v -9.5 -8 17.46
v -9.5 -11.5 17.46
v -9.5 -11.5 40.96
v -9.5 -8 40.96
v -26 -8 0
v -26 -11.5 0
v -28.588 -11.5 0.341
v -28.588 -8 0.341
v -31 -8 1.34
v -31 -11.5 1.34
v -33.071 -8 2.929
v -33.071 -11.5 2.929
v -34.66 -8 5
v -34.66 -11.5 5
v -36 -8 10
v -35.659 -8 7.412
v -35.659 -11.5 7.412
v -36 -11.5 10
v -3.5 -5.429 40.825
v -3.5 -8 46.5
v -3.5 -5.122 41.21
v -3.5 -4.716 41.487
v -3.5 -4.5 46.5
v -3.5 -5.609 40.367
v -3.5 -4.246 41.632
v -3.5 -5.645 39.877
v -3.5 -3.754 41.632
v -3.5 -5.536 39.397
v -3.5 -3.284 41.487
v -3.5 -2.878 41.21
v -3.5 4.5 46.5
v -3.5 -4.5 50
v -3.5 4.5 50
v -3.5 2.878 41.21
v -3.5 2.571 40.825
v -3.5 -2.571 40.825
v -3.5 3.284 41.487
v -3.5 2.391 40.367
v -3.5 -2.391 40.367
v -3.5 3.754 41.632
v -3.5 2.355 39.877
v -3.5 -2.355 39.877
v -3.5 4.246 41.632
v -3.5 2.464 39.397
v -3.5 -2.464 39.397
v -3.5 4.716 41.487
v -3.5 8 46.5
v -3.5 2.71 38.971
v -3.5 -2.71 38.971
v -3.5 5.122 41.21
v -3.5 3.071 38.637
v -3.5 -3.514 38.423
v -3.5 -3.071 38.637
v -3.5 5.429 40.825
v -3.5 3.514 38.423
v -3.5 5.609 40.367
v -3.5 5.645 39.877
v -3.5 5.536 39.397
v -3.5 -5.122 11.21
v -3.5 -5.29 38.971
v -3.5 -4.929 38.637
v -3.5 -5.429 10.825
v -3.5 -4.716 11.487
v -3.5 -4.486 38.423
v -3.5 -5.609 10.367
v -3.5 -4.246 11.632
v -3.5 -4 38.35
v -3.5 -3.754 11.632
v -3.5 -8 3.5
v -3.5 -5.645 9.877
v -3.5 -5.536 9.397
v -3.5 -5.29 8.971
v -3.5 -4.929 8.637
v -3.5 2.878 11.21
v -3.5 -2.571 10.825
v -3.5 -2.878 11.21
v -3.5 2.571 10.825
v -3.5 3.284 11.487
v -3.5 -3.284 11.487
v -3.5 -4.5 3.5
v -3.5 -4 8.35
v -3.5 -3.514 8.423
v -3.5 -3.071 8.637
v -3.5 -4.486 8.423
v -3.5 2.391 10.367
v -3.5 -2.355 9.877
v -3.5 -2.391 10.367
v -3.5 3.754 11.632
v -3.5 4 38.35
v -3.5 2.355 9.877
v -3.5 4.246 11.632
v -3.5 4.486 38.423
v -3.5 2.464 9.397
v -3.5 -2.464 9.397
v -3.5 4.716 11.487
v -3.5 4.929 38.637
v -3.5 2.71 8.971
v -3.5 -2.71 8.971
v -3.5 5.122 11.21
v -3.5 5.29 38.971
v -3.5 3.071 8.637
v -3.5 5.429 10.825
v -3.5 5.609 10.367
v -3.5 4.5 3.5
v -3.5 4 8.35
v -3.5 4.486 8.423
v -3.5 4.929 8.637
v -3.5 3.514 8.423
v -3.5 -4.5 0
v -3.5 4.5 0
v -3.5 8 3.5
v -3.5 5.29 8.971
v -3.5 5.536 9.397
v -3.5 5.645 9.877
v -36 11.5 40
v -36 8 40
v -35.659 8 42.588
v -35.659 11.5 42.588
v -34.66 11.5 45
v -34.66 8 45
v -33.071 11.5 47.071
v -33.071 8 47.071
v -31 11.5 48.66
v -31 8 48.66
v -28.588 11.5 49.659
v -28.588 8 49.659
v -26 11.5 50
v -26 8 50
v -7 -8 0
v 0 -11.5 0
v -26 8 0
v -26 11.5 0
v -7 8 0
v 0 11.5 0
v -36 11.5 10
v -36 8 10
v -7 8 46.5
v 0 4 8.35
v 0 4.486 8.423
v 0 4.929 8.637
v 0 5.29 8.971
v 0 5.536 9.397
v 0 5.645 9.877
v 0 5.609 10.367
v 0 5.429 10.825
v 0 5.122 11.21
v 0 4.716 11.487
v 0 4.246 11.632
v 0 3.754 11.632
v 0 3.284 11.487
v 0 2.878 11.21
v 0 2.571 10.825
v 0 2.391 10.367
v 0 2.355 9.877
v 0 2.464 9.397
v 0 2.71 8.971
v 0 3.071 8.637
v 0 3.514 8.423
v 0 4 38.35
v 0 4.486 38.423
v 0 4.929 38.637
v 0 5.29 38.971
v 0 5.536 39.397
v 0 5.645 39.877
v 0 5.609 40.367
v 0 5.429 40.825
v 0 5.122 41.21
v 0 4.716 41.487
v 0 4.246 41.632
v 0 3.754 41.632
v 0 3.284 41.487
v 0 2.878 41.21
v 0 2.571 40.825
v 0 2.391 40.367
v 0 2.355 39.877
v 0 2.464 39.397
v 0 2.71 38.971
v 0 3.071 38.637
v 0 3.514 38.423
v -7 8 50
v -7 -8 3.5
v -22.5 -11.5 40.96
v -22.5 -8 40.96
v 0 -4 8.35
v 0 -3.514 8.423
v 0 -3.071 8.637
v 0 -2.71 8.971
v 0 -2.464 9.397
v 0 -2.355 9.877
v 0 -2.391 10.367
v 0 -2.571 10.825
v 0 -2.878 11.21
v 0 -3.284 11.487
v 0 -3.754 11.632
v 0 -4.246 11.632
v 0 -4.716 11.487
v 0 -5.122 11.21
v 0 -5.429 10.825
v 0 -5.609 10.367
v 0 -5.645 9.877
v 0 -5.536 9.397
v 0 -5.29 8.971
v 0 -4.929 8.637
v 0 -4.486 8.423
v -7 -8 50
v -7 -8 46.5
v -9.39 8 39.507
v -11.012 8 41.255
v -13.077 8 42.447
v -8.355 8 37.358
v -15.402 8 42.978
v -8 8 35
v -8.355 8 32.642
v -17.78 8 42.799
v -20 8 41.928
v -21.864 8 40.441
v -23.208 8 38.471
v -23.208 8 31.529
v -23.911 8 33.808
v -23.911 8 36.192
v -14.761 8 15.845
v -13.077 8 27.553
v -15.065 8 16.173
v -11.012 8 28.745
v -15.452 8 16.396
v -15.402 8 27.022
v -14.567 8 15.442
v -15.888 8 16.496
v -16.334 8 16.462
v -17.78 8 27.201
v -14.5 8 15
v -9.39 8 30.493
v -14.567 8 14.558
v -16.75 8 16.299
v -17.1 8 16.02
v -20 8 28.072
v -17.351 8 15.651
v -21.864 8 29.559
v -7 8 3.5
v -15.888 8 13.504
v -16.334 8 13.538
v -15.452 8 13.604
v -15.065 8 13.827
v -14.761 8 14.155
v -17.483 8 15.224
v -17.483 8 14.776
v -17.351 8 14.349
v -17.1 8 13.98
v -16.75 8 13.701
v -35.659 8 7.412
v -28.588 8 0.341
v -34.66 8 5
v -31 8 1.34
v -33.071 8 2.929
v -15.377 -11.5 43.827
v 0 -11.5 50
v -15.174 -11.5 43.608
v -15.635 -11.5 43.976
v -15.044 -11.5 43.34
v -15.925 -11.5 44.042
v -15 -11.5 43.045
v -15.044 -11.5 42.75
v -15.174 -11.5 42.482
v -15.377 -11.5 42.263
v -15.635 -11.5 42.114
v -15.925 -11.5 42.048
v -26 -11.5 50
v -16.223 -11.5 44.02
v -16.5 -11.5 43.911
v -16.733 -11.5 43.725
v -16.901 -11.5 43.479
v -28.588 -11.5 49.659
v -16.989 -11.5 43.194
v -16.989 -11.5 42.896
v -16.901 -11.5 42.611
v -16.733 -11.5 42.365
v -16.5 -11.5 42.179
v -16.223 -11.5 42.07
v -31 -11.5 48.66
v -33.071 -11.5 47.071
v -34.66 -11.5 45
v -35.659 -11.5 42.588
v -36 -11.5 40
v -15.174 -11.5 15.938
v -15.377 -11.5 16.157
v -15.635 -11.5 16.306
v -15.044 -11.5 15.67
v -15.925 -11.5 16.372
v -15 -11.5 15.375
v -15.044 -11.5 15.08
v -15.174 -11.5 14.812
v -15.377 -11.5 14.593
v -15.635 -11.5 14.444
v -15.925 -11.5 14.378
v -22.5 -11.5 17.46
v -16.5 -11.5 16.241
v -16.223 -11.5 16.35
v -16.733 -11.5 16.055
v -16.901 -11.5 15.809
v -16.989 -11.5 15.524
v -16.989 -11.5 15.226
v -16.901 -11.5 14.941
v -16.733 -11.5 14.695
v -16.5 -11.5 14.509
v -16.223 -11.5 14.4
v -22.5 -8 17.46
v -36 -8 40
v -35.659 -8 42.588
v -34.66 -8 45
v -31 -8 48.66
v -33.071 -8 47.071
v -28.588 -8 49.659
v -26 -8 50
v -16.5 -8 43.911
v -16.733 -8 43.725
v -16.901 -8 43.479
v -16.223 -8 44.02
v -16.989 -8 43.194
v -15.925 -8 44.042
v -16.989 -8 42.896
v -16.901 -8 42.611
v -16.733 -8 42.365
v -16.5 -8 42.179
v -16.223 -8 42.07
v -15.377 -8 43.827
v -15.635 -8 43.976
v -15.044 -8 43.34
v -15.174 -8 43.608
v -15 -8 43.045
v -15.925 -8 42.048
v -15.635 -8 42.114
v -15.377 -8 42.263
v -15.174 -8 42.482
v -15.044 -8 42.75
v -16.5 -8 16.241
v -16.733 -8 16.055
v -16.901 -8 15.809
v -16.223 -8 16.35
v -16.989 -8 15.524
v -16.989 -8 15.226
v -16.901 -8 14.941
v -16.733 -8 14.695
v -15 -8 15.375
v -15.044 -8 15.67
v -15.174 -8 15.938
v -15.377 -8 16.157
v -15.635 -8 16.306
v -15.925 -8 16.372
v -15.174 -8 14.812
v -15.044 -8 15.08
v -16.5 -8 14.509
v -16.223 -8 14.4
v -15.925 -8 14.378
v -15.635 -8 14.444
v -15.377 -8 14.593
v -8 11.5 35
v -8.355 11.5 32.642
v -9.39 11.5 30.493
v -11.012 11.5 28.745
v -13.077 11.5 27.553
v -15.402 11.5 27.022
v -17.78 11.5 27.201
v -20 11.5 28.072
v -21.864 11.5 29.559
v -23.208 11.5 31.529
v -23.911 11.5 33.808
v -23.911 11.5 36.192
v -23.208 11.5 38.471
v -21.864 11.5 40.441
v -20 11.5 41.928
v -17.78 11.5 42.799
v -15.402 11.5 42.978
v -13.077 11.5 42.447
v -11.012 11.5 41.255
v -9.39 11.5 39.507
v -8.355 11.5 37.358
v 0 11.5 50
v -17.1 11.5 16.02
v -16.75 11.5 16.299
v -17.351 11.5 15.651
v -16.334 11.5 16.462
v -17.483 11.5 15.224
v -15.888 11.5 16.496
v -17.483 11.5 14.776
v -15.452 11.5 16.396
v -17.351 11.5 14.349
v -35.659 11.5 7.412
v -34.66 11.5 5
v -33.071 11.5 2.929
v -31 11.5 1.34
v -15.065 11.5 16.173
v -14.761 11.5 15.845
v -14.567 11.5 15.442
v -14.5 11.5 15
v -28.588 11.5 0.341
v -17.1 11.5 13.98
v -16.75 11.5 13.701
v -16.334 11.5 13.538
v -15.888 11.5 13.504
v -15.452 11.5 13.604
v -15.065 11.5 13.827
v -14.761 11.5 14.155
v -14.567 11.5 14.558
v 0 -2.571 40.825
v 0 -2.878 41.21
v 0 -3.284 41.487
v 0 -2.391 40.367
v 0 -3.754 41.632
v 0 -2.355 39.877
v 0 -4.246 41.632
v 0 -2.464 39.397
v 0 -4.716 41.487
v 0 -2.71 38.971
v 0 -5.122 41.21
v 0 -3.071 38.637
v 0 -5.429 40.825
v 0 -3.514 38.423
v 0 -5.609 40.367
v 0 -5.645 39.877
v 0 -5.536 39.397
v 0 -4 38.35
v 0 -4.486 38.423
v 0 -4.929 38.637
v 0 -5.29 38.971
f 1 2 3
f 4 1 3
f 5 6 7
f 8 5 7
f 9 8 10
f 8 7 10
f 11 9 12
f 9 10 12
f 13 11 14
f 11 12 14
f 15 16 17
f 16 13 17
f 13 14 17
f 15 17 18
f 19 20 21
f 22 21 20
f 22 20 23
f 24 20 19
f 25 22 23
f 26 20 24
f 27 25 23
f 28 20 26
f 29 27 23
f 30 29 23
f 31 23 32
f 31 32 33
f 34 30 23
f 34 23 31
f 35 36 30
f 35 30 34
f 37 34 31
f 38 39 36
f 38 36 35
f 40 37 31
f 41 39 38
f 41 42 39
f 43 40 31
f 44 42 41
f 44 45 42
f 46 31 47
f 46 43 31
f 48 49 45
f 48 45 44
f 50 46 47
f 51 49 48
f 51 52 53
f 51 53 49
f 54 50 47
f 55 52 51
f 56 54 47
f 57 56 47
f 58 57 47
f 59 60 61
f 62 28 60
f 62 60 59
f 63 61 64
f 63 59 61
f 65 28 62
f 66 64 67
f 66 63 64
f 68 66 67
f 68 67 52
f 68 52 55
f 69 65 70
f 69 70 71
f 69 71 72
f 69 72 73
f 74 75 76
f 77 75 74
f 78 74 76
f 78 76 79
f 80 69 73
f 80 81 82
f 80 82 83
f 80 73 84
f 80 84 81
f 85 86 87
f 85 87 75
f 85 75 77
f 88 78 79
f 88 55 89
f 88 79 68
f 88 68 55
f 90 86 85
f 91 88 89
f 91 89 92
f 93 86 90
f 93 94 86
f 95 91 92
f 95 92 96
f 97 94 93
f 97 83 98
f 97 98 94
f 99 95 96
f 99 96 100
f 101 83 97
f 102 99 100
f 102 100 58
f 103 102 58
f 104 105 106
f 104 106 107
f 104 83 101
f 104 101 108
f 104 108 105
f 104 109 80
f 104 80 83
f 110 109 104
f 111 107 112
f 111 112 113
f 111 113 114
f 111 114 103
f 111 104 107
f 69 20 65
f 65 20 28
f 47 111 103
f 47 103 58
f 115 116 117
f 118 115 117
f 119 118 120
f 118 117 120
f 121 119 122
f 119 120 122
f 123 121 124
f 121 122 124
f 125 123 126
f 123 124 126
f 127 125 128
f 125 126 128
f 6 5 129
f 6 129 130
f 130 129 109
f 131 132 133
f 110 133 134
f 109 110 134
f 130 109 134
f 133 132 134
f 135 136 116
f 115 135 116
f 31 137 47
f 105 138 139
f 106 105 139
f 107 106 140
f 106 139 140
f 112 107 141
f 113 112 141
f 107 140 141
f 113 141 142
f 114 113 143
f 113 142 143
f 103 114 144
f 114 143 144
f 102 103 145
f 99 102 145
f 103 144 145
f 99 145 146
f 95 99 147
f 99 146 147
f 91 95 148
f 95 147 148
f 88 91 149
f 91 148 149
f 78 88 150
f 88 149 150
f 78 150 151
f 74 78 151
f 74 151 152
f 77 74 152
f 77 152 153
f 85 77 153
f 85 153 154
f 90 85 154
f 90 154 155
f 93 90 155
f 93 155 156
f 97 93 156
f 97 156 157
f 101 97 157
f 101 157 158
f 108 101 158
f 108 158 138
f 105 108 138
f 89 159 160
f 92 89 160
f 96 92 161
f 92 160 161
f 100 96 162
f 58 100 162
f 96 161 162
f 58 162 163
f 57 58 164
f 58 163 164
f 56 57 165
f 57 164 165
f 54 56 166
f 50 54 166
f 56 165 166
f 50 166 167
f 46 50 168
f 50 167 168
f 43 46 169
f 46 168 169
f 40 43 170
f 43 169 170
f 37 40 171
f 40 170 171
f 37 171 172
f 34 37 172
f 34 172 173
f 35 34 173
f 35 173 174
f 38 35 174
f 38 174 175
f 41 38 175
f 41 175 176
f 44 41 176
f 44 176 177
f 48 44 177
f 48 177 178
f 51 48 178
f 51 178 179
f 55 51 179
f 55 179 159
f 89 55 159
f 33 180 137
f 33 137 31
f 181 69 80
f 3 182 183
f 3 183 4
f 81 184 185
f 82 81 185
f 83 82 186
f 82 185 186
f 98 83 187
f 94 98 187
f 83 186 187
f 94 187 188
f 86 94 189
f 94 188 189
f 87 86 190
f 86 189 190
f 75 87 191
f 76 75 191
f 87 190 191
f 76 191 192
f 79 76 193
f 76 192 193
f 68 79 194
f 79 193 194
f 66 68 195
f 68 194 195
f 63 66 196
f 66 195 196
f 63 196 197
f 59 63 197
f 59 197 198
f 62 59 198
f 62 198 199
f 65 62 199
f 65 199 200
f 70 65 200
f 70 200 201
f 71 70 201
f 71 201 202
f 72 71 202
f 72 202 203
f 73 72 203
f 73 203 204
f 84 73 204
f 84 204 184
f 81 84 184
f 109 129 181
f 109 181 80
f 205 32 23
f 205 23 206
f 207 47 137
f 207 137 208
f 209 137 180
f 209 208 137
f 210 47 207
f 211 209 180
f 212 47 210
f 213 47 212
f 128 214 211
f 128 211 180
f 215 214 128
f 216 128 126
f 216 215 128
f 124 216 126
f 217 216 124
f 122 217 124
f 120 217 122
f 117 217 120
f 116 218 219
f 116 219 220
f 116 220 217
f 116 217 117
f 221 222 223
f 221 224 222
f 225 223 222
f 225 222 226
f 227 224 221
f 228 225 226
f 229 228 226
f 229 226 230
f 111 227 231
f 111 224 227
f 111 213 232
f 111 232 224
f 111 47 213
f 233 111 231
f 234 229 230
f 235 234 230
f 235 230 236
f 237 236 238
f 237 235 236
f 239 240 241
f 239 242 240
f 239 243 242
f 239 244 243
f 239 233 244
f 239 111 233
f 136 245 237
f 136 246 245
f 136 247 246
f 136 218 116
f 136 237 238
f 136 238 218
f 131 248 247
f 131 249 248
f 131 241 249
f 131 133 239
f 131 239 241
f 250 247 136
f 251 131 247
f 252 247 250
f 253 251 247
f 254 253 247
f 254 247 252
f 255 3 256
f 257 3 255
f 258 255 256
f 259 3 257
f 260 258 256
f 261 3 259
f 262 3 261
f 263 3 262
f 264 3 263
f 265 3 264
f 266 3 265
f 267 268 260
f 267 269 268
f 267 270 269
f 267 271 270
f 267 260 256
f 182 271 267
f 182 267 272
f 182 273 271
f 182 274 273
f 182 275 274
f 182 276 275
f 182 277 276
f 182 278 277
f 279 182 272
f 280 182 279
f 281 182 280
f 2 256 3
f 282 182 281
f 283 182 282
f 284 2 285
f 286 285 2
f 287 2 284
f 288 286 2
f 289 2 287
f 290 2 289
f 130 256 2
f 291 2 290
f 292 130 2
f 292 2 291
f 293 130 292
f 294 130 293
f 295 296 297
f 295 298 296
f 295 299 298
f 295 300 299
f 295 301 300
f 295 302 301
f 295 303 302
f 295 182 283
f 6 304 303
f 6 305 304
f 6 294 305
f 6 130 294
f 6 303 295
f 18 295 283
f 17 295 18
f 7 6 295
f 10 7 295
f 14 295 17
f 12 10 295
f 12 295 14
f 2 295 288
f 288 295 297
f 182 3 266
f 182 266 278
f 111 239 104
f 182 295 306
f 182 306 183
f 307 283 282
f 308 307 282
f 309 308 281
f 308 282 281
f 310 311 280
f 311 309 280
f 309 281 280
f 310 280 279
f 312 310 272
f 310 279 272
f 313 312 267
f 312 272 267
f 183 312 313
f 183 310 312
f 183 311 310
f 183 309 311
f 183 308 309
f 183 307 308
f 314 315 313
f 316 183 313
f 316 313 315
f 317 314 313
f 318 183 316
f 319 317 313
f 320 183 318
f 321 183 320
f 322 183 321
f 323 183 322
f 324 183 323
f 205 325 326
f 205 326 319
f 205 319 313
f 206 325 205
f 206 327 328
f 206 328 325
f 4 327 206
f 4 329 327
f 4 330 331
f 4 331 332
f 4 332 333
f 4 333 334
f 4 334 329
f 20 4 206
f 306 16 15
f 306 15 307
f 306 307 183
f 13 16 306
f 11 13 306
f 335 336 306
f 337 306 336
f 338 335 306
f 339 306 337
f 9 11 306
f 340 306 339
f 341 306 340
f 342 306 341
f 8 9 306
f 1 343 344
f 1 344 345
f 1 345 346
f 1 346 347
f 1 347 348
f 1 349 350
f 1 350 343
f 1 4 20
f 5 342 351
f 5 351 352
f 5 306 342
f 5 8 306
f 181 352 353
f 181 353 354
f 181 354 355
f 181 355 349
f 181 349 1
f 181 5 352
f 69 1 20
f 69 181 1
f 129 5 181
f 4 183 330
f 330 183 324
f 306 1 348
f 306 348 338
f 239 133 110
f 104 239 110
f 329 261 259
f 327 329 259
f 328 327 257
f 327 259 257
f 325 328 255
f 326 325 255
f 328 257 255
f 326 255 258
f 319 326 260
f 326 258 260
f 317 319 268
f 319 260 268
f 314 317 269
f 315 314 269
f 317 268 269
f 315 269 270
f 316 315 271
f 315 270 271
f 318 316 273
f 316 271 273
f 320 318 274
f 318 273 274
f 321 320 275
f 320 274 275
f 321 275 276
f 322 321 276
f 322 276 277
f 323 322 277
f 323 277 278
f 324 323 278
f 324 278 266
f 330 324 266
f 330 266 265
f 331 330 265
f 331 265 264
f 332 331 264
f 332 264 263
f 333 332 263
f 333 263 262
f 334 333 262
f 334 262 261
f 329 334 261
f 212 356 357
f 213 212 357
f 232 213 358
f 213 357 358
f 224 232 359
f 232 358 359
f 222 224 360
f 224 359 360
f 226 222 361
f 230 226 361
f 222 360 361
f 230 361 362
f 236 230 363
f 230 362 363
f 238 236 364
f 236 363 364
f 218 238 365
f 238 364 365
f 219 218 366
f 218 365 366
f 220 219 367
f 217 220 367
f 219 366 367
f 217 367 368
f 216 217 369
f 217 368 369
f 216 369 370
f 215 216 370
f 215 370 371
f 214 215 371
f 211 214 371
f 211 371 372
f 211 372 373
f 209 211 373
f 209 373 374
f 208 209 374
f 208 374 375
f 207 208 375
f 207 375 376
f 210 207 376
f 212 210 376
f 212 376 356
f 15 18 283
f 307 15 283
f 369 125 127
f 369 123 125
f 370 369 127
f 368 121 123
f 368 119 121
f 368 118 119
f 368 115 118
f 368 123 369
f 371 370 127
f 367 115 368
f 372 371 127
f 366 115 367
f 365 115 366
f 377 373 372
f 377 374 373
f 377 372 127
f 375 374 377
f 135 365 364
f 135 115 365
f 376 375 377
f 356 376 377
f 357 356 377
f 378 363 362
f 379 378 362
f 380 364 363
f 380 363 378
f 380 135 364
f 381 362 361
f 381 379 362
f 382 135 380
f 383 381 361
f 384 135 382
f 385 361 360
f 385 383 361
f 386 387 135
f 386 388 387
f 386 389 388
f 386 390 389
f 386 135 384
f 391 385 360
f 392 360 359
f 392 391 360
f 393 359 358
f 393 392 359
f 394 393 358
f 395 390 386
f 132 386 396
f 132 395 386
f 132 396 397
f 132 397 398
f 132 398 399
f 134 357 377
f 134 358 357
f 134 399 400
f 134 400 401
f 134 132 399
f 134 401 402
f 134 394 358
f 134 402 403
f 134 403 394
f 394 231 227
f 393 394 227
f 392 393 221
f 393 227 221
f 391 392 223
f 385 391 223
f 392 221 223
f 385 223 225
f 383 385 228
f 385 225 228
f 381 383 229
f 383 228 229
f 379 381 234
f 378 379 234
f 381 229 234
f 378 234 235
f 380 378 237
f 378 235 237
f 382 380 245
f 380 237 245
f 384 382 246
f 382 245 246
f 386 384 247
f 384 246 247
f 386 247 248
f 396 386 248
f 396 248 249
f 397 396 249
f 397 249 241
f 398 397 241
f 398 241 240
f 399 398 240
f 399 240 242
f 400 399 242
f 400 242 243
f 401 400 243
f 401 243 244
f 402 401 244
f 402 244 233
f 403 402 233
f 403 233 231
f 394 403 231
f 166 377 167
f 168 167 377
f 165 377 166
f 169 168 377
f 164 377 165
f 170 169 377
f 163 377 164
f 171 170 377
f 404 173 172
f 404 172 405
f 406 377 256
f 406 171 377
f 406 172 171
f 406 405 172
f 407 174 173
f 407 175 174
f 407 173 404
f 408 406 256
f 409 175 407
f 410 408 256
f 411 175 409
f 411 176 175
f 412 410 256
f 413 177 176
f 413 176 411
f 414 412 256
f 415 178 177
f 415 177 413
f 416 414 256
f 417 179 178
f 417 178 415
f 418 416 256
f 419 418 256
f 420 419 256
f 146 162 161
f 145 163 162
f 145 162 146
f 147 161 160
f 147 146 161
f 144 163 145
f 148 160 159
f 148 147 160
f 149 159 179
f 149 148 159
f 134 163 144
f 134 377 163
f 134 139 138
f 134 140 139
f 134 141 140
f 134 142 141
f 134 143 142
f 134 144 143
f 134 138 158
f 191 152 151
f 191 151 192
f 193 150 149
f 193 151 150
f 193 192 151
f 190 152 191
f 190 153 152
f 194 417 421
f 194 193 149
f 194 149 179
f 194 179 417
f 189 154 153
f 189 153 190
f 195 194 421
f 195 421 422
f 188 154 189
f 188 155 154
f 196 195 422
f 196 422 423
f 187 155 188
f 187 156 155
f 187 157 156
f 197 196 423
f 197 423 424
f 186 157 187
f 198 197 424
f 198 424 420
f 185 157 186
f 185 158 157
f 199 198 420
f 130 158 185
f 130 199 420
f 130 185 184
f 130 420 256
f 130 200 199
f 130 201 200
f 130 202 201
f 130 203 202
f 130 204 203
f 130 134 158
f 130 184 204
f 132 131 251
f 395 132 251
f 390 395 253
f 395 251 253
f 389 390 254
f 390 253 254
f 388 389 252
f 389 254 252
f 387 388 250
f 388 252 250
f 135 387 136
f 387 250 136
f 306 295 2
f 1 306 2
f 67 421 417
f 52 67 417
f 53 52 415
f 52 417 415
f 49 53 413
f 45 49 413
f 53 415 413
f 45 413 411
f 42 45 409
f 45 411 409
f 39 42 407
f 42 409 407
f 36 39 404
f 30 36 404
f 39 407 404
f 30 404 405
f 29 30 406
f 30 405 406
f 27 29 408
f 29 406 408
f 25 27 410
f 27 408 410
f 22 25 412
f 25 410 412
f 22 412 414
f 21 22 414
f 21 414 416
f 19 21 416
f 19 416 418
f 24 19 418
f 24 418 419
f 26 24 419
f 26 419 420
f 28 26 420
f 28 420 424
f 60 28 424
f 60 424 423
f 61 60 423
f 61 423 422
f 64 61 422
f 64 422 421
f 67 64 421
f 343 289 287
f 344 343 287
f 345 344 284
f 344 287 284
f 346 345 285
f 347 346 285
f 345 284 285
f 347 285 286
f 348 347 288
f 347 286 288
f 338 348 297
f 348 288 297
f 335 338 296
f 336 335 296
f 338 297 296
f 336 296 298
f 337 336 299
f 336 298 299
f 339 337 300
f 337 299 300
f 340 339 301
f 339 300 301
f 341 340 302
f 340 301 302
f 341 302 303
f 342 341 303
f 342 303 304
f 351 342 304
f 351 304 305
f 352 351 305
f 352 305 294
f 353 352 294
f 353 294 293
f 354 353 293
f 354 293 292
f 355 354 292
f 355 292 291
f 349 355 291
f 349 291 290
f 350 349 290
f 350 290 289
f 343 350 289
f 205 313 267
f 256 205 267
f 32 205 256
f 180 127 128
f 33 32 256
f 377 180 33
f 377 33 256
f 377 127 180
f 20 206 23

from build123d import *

# Parameters (mm, degrees)
EXTRUDE_1_DEPTH     = 50
CUT_EXTRUDE_START   = -19.5
SKETCH_2_R          = 1.5
CUT_EXTRUDE_1_DEPTH = 70
SKETCH_3_OUTSIDE_W  = 61.218
SKETCH_3_OUTSIDE_H  = 66.218
CUT_EXTRUDE_2_DEPTH = 70
SKETCH_5_R          = 1
CUT_EXTRUDE_5_DEPTH = 10
SKETCH_6_W          = 13
SKETCH_6_H          = 23.5
CUT_EXTRUDE_6_DEPTH = 10
SKETCH_7_R          = 1.65
CUT_EXTRUDE_7_DEPTH = 10
SKETCH_8_R          = 8
CUT_EXTRUDE_8_DEPTH = 10
EXTRUDE_2_DEPTH     = 3.5
EXTRUDE_3_DEPTH     = 3.5


with BuildPart() as part:
    # 草图1 → 凸台-拉伸1 (new body)
    with BuildSketch(Plane.XY):
        Polygon((-45, 11.5), (0, 11.5), (0, -11.5), (-45, -11.5), (-45, -8), (-3.5, -8), (-3.5, 8), (-45, 8), align=None)
    extrude(amount=EXTRUDE_1_DEPTH)

    # 草图2 → 切除-拉伸1 (cut)
    with BuildSketch(Plane.XZ.offset(11.5).offset(CUT_EXTRUDE_START)):
        with Locations((-16, 35)):
            Circle(SKETCH_2_R)
        with Locations((-16, 15)):
            Circle(SKETCH_2_R)
    extrude(amount=-CUT_EXTRUDE_1_DEPTH, mode=Mode.SUBTRACT)

    # 草图3 outside → 切除-拉伸2 (cut)
    with BuildSketch(Plane.XZ.offset(11.5)):
        with Locations((-22.5, 25)):
            Rectangle(SKETCH_3_OUTSIDE_W, SKETCH_3_OUTSIDE_H)
        with BuildLine():
            Line((-36, 10), (-36, 40))
            ThreePointArc((-36, 40), (-33.071067812, 47.071067812), (-26, 50))
            Line((-26, 50), (0, 50))
            Line((0, 50), (0, 0))
            Line((0, 0), (-26, 0))
            ThreePointArc((-26, 0), (-33.071067812, 2.928932188), (-36, 10))
        make_face(mode=Mode.SUBTRACT)
    extrude(amount=-CUT_EXTRUDE_2_DEPTH, mode=Mode.SUBTRACT)

    # 草图5 → 切除-拉伸5 (cut)
    with BuildSketch(Plane.XZ.offset(11.5)):
        with Locations((-16, 43.045)):
            Circle(SKETCH_5_R)
        with Locations((-16, 15.375)):
            Circle(SKETCH_5_R)
    extrude(amount=-CUT_EXTRUDE_5_DEPTH, mode=Mode.SUBTRACT)

    # 草图6 → 切除-拉伸6 (cut)
    with BuildSketch(Plane.XZ.offset(11.5)):
        with Locations((-16, 29.21)):
            Rectangle(SKETCH_6_W, SKETCH_6_H)
    extrude(amount=-CUT_EXTRUDE_6_DEPTH, mode=Mode.SUBTRACT)

    # 草图7 → 切除-拉伸7 (cut)
    with BuildSketch(Plane(origin=(0, 0, 0), x_dir=(0, 0, -1), z_dir=(1, 0, 0))):
        with Locations((-10, 4)):
            Circle(SKETCH_7_R)
        with Locations((-40, 4)):
            Circle(SKETCH_7_R)
        with Locations((-10, -4)):
            Circle(SKETCH_7_R)
        with Locations((-40, -4)):
            Circle(SKETCH_7_R)
    extrude(amount=-CUT_EXTRUDE_7_DEPTH, mode=Mode.SUBTRACT)

    # 草图8 → 切除-拉伸8 (cut)
    with BuildSketch(Plane(origin=(0, 11.5, 0), x_dir=(1, 0, 0), z_dir=(0, 1, 0))):
        with Locations((-16, -35)):
            Circle(SKETCH_8_R)
    extrude(amount=-CUT_EXTRUDE_8_DEPTH, mode=Mode.SUBTRACT)

    # 草图9 → 凸台-拉伸2 (add)
    with BuildSketch(Plane(origin=(0, 0, 0), x_dir=(-1, 0, 0), z_dir=(0, 0, -1))):
        Polygon((3.5, 4.5), (3.5, 8), (7, 8), align=None)
        Polygon((3.5, -8), (7, -8), (3.5, -4.5), align=None)
    extrude(amount=-EXTRUDE_2_DEPTH)

    # 草图10 → 凸台-拉伸3 (add)
    with BuildSketch(Plane.XY.offset(50)):
        Polygon((-3.5, 8), (-7, 8), (-3.5, 4.5), align=None)
        Polygon((-3.5, -8), (-3.5, -4.5), (-7, -8), align=None)
    extrude(amount=-EXTRUDE_3_DEPTH)


solid = part.part
